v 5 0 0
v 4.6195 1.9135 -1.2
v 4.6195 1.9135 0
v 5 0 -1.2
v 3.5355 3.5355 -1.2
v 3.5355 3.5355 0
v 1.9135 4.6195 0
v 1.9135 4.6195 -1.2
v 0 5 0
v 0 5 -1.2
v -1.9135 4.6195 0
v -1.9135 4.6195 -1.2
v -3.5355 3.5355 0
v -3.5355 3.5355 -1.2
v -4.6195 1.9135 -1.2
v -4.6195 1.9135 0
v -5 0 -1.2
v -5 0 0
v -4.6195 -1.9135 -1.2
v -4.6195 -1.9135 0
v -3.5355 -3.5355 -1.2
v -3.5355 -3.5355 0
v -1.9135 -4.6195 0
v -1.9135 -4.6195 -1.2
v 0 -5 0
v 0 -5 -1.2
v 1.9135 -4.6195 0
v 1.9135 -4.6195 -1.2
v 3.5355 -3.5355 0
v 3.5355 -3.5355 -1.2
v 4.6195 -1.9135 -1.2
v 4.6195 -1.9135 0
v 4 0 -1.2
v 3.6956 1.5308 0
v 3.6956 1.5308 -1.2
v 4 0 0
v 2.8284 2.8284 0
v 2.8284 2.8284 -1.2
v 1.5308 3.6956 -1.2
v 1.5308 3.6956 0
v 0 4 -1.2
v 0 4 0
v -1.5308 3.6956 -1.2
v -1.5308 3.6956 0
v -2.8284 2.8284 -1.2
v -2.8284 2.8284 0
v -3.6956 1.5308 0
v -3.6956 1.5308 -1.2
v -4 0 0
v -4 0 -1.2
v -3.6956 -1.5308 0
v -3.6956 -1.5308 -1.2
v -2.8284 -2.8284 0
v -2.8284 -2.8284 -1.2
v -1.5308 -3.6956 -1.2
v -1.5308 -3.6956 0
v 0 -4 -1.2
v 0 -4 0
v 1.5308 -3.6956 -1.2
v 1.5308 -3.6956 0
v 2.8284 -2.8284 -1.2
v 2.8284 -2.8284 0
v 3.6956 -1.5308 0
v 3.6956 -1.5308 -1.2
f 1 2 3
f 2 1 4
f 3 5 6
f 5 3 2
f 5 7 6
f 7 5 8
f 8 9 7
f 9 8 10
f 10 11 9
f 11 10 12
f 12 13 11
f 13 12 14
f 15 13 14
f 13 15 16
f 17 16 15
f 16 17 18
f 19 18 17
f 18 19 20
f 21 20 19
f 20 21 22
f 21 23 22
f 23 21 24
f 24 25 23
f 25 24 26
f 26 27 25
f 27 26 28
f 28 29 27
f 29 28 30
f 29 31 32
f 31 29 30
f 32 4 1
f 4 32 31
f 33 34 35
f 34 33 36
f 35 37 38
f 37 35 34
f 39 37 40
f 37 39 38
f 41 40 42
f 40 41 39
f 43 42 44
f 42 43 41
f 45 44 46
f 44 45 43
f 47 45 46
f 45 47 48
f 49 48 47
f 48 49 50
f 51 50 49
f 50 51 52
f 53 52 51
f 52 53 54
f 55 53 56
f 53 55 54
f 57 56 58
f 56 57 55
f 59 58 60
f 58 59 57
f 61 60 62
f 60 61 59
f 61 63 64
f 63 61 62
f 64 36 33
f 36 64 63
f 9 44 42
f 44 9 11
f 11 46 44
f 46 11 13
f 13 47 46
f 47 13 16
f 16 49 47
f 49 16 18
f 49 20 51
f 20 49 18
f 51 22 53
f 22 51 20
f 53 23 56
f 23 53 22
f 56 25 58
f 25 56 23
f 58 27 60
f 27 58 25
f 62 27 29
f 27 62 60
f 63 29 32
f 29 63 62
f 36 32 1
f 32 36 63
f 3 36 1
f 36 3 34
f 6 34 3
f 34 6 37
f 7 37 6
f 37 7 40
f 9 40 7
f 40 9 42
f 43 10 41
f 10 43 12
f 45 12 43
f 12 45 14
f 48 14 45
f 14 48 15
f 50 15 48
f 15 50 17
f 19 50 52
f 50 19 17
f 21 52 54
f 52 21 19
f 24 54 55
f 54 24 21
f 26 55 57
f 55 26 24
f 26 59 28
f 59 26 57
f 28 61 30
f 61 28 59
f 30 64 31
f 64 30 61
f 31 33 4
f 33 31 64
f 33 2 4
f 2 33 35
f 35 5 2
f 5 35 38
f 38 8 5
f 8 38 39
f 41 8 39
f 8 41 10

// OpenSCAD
// file: ../p/4-4edge.scad
use <../lib.scad>
function ldraw_lib__4_4edge() = [
// 0 Circle 1.0
// 0 Name: 4-4edge.dat
// 0 Author: James Jessiman
// 0 !LDRAW_ORG Primitive UPDATE 2017-01
// 0 !LICENSE Licensed under CC BY 2.0 and CC BY 4.0 : see CAreadme.txt
// 
// 0 BFC CERTIFY CCW
  [0,"BFC","CERTIFY"],
  [0,"BFC","CCW"],
// 
// 0 !HISTORY 1998-12-15 [PTadmin] Official Update 1998-10
// 0 !HISTORY 2005-12-28 [PTadmin] Official Update 2005-01
// 0 !HISTORY 2007-06-24 [PTadmin] Header formatted for Contributor Agreement
// 0 !HISTORY 2008-07-01 [PTadmin] Official Update 2008-01
// 0 !HISTORY 2017-01-15 [Steffen] BFCed
// 0 !HISTORY 2017-12-30 [PTadmin] Official Update 2017-01
// 
// 
// 2 24 1 0 0 0.9239 0 0.3827
  [2,24,1,0,0,0.9239,0,0.3827],
// 2 24 0.9239 0 0.3827 0.7071 0 0.7071
  [2,24,0.9239,0,0.3827,0.7071,0,0.7071],
// 2 24 0.7071 0 0.7071 0.3827 0 0.9239
  [2,24,0.7071,0,0.7071,0.3827,0,0.9239],
// 2 24 0.3827 0 0.9239 0 0 1
  [2,24,0.3827,0,0.9239,0,0,1],
// 2 24 0 0 1 -0.3827 0 0.9239
  [2,24,0,0,1,-0.3827,0,0.9239],
// 2 24 -0.3827 0 0.9239 -0.7071 0 0.7071
  [2,24,-0.3827,0,0.9239,-0.7071,0,0.7071],
// 2 24 -0.7071 0 0.7071 -0.9239 0 0.3827
  [2,24,-0.7071,0,0.7071,-0.9239,0,0.3827],
// 2 24 -0.9239 0 0.3827 -1 0 -0
  [2,24,-0.9239,0,0.3827,-1,0,-0],
// 2 24 -1 0 -0 -0.9239 0 -0.3827
  [2,24,-1,0,-0,-0.9239,0,-0.3827],
// 2 24 -0.9239 0 -0.3827 -0.7071 0 -0.7071
  [2,24,-0.9239,0,-0.3827,-0.7071,0,-0.7071],
// 2 24 -0.7071 0 -0.7071 -0.3827 0 -0.9239
  [2,24,-0.7071,0,-0.7071,-0.3827,0,-0.9239],
// 2 24 -0.3827 0 -0.9239 0 0 -1
  [2,24,-0.3827,0,-0.9239,0,0,-1],
// 2 24 0 0 -1 0.3827 0 -0.9239
  [2,24,0,0,-1,0.3827,0,-0.9239],
// 2 24 0.3827 0 -0.9239 0.7071 0 -0.7071
  [2,24,0.3827,0,-0.9239,0.7071,0,-0.7071],
// 2 24 0.7071 0 -0.7071 0.9239 0 -0.3827
  [2,24,0.7071,0,-0.7071,0.9239,0,-0.3827],
// 2 24 0.9239 0 -0.3827 1 0 0
  [2,24,0.9239,0,-0.3827,1,0,0],
];
makepoly(ldraw_lib__4_4edge(), line=0.2);
// file: ../p/4-4cyli.scad
use <../lib.scad>
function ldraw_lib__4_4cyli() = [
// 0 Cylinder 1.0
// 0 Name: 4-4cyli.dat
// 0 Author: James Jessiman
// 0 !LDRAW_ORG Primitive UPDATE 2005-01
// 0 !LICENSE Licensed under CC BY 2.0 and CC BY 4.0 : see CAreadme.txt
// 
// 0 BFC CERTIFY CCW
  [0,"BFC","CERTIFY"],
  [0,"BFC","CCW"],
// 
// 0 !HISTORY 1998-12-15 [PTadmin] Official Update 1998-10
// 0 !HISTORY 2002-03-23 [sbliss] Added BFC statement; merged headers from files in distributions LDraw 0.27 and Complete.
// 0 !HISTORY 2002-04-25 [PTadmin] Official Update 2002-02
// 0 !HISTORY 2004-12-14 [guyvivan] BFC CCW
// 0 !HISTORY 2005-12-28 [PTadmin] Official Update 2005-01
// 0 !HISTORY 2007-06-24 [PTadmin] Header formatted for Contributor Agreement
// 0 !HISTORY 2008-07-01 [PTadmin] Official Update 2008-01
// 
// 
// 4 16 1 1 0 0.9239 1 0.3827 0.9239 0 0.3827 1 0 0
  [4,16,1,1,0,0.9239,1,0.3827,0.9239,0,0.3827,1,0,0],
// 5 24 1 0 0 1 1 0 0.9239 0 0.3827 0.9239 0 -0.3827
  [5,24,1,0,0,1,1,0,0.9239,0,0.3827,0.9239,0,-0.3827],
// 4 16 0.9239 1 0.3827 0.7071 1 0.7071 0.7071 0 0.7071 0.9239 0 0.3827
  [4,16,0.9239,1,0.3827,0.7071,1,0.7071,0.7071,0,0.7071,0.9239,0,0.3827],
// 5 24 0.9239 0 0.3827 0.9239 1 0.3827 0.7071 0 0.7071 1 0 0
  [5,24,0.9239,0,0.3827,0.9239,1,0.3827,0.7071,0,0.7071,1,0,0],
// 4 16 0.7071 1 0.7071 0.3827 1 0.9239 0.3827 0 0.9239 0.7071 0 0.7071
  [4,16,0.7071,1,0.7071,0.3827,1,0.9239,0.3827,0,0.9239,0.7071,0,0.7071],
// 5 24 0.7071 0 0.7071 0.7071 1 0.7071 0.3827 0 0.9239 0.9239 0 0.3827
  [5,24,0.7071,0,0.7071,0.7071,1,0.7071,0.3827,0,0.9239,0.9239,0,0.3827],
// 4 16 0.3827 1 0.9239 0 1 1 0 0 1 0.3827 0 0.9239
  [4,16,0.3827,1,0.9239,0,1,1,0,0,1,0.3827,0,0.9239],
// 5 24 0.3827 0 0.9239 0.3827 1 0.9239 0 0 1 0.7071 0 0.7071
  [5,24,0.3827,0,0.9239,0.3827,1,0.9239,0,0,1,0.7071,0,0.7071],
// 4 16 0 1 1 -0.3827 1 0.9239 -0.3827 0 0.9239 0 0 1
  [4,16,0,1,1,-0.3827,1,0.9239,-0.3827,0,0.9239,0,0,1],
// 5 24 0 0 1 0 1 1 -0.3827 0 0.9239 0.3827 0 0.9239
  [5,24,0,0,1,0,1,1,-0.3827,0,0.9239,0.3827,0,0.9239],
// 4 16 -0.3827 1 0.9239 -0.7071 1 0.7071 -0.7071 0 0.7071 -0.3827 0 0.9239
  [4,16,-0.3827,1,0.9239,-0.7071,1,0.7071,-0.7071,0,0.7071,-0.3827,0,0.9239],
// 5 24 -0.3827 0 0.9239 -0.3827 1 0.9239 -0.7071 0 0.7071 0 0 1
  [5,24,-0.3827,0,0.9239,-0.3827,1,0.9239,-0.7071,0,0.7071,0,0,1],
// 4 16 -0.7071 1 0.7071 -0.9239 1 0.3827 -0.9239 0 0.3827 -0.7071 0 0.7071
  [4,16,-0.7071,1,0.7071,-0.9239,1,0.3827,-0.9239,0,0.3827,-0.7071,0,0.7071],
// 5 24 -0.7071 0 0.7071 -0.7071 1 0.7071 -0.9239 0 0.3827 -0.3827 0 0.9239
  [5,24,-0.7071,0,0.7071,-0.7071,1,0.7071,-0.9239,0,0.3827,-0.3827,0,0.9239],
// 4 16 -0.9239 1 0.3827 -1 1 0 -1 0 0 -0.9239 0 0.3827
  [4,16,-0.9239,1,0.3827,-1,1,0,-1,0,0,-0.9239,0,0.3827],
// 5 24 -0.9239 0 0.3827 -0.9239 1 0.3827 -1 0 0 -0.7071 0 0.7071
  [5,24,-0.9239,0,0.3827,-0.9239,1,0.3827,-1,0,0,-0.7071,0,0.7071],
// 4 16 -1 1 0 -0.9239 1 -0.3827 -0.9239 0 -0.3827 -1 0 0
  [4,16,-1,1,0,-0.9239,1,-0.3827,-0.9239,0,-0.3827,-1,0,0],
// 5 24 -1 0 0 -1 1 0 -0.9239 0 -0.3827 -0.9239 0 0.3827
  [5,24,-1,0,0,-1,1,0,-0.9239,0,-0.3827,-0.9239,0,0.3827],
// 4 16 -0.9239 1 -0.3827 -0.7071 1 -0.7071 -0.7071 0 -0.7071 -0.9239 0 -0.3827
  [4,16,-0.9239,1,-0.3827,-0.7071,1,-0.7071,-0.7071,0,-0.7071,-0.9239,0,-0.3827],
// 5 24 -0.9239 0 -0.3827 -0.9239 1 -0.3827 -0.7071 0 -0.7071 -1 0 0
  [5,24,-0.9239,0,-0.3827,-0.9239,1,-0.3827,-0.7071,0,-0.7071,-1,0,0],
// 4 16 -0.7071 1 -0.7071 -0.3827 1 -0.9239 -0.3827 0 -0.9239 -0.7071 0 -0.7071
  [4,16,-0.7071,1,-0.7071,-0.3827,1,-0.9239,-0.3827,0,-0.9239,-0.7071,0,-0.7071],
// 5 24 -0.7071 0 -0.7071 -0.7071 1 -0.7071 -0.3827 0 -0.9239 -0.9239 0 -0.3827
  [5,24,-0.7071,0,-0.7071,-0.7071,1,-0.7071,-0.3827,0,-0.9239,-0.9239,0,-0.3827],
// 4 16 -0.3827 1 -0.9239 0 1 -1 0 0 -1 -0.3827 0 -0.9239
  [4,16,-0.3827,1,-0.9239,0,1,-1,0,0,-1,-0.3827,0,-0.9239],
// 5 24 -0.3827 0 -0.9239 -0.3827 1 -0.9239 0 0 -1 -0.7071 0 -0.7071
  [5,24,-0.3827,0,-0.9239,-0.3827,1,-0.9239,0,0,-1,-0.7071,0,-0.7071],
// 4 16 0 1 -1 0.3827 1 -0.9239 0.3827 0 -0.9239 0 0 -1
  [4,16,0,1,-1,0.3827,1,-0.9239,0.3827,0,-0.9239,0,0,-1],
// 5 24 0 0 -1 0 1 -1 0.3827 0 -0.9239 -0.3827 0 -0.9239
  [5,24,0,0,-1,0,1,-1,0.3827,0,-0.9239,-0.3827,0,-0.9239],
// 4 16 0.3827 1 -0.9239 0.7071 1 -0.7071 0.7071 0 -0.7071 0.3827 0 -0.9239
  [4,16,0.3827,1,-0.9239,0.7071,1,-0.7071,0.7071,0,-0.7071,0.3827,0,-0.9239],
// 5 24 0.3827 0 -0.9239 0.3827 1 -0.9239 0.7071 0 -0.7071 0 0 -1
  [5,24,0.3827,0,-0.9239,0.3827,1,-0.9239,0.7071,0,-0.7071,0,0,-1],
// 4 16 0.7071 1 -0.7071 0.9239 1 -0.3827 0.9239 0 -0.3827 0.7071 0 -0.7071
  [4,16,0.7071,1,-0.7071,0.9239,1,-0.3827,0.9239,0,-0.3827,0.7071,0,-0.7071],
// 5 24 0.7071 0 -0.7071 0.7071 1 -0.7071 0.9239 0 -0.3827 0.3827 0 -0.9239
  [5,24,0.7071,0,-0.7071,0.7071,1,-0.7071,0.9239,0,-0.3827,0.3827,0,-0.9239],
// 4 16 0.9239 1 -0.3827 1 1 0 1 0 0 0.9239 0 -0.3827
  [4,16,0.9239,1,-0.3827,1,1,0,1,0,0,0.9239,0,-0.3827],
// 5 24 0.9239 0 -0.3827 0.9239 1 -0.3827 1 0 0 0.7071 0 -0.7071
  [5,24,0.9239,0,-0.3827,0.9239,1,-0.3827,1,0,0,0.7071,0,-0.7071],
// 0
];
makepoly(ldraw_lib__4_4cyli(), line=0.2);
// file: ../p/4-4ring4.scad
use <../lib.scad>
function ldraw_lib__4_4ring4() = [
// 0 Ring  4 x 1.0
// 0 Name: 4-4ring4.dat
// 0 Author: James Jessiman
// 0 !LDRAW_ORG Primitive UPDATE 2009-01
// 0 !LICENSE Licensed under CC BY 2.0 and CC BY 4.0 : see CAreadme.txt
// 
// 0 BFC CERTIFY CCW
  [0,"BFC","CERTIFY"],
  [0,"BFC","CCW"],
// 
// 0 !HISTORY 1998-12-15 [PTadmin] Official Update 1998-10
// 0 !HISTORY 2002-04-08 [BrickCaster] Modified for BFC compliance
// 0 !HISTORY 2002-04-25 [PTadmin] Official Update 2002-02
// 0 !HISTORY 2007-06-24 [PTadmin] Header formatted for Contributor Agreement
// 0 !HISTORY 2008-07-01 [PTadmin] Official Update 2008-01
// 0 !HISTORY 2008-08-26 [cwdee] Switch polygon winding and rename
// 0 !HISTORY 2009-05-02 [PTadmin] Official Update 2009-01
// 
// 
// 4 16 -1.9135 0 4.6195 -1.5308 0 3.6956 0 0 4 0 0 5
  [4,16,-1.9135,0,4.6195,-1.5308,0,3.6956,0,0,4,0,0,5],
// 4 16 -3.5355 0 3.5355 -2.8284 0 2.8284 -1.5308 0 3.6956 -1.9135 0 4.6195
  [4,16,-3.5355,0,3.5355,-2.8284,0,2.8284,-1.5308,0,3.6956,-1.9135,0,4.6195],
// 4 16 -4.6195 0 1.9135 -3.6956 0 1.5308 -2.8284 0 2.8284 -3.5355 0 3.5355
  [4,16,-4.6195,0,1.9135,-3.6956,0,1.5308,-2.8284,0,2.8284,-3.5355,0,3.5355],
// 4 16 -5 0 0 -4 0 0 -3.6956 0 1.5308 -4.6195 0 1.9135
  [4,16,-5,0,0,-4,0,0,-3.6956,0,1.5308,-4.6195,0,1.9135],
// 4 16 -4.6195 0 -1.9135 -3.6956 0 -1.5308 -4 0 0 -5 0 0
  [4,16,-4.6195,0,-1.9135,-3.6956,0,-1.5308,-4,0,0,-5,0,0],
// 4 16 -3.5355 0 -3.5355 -2.8284 0 -2.8284 -3.6956 0 -1.5308 -4.6195 0 -1.9135
  [4,16,-3.5355,0,-3.5355,-2.8284,0,-2.8284,-3.6956,0,-1.5308,-4.6195,0,-1.9135],
// 4 16 -1.9135 0 -4.6195 -1.5308 0 -3.6956 -2.8284 0 -2.8284 -3.5355 0 -3.5355
  [4,16,-1.9135,0,-4.6195,-1.5308,0,-3.6956,-2.8284,0,-2.8284,-3.5355,0,-3.5355],
// 4 16 0 0 -5 0 0 -4 -1.5308 0 -3.6956 -1.9135 0 -4.6195
  [4,16,0,0,-5,0,0,-4,-1.5308,0,-3.6956,-1.9135,0,-4.6195],
// 4 16 1.9135 0 -4.6195 1.5308 0 -3.6956 0 0 -4 0 0 -5
  [4,16,1.9135,0,-4.6195,1.5308,0,-3.6956,0,0,-4,0,0,-5],
// 4 16 3.5355 0 -3.5355 2.8284 0 -2.8284 1.5308 0 -3.6956 1.9135 0 -4.6195
  [4,16,3.5355,0,-3.5355,2.8284,0,-2.8284,1.5308,0,-3.6956,1.9135,0,-4.6195],
// 4 16 4.6195 0 -1.9135 3.6956 0 -1.5308 2.8284 0 -2.8284 3.5355 0 -3.5355
  [4,16,4.6195,0,-1.9135,3.6956,0,-1.5308,2.8284,0,-2.8284,3.5355,0,-3.5355],
// 4 16 5 0 0 4 0 0 3.6956 0 -1.5308 4.6195 0 -1.9135
  [4,16,5,0,0,4,0,0,3.6956,0,-1.5308,4.6195,0,-1.9135],
// 4 16 4.6195 0 1.9135 3.6956 0 1.5308 4 0 0 5 0 0
  [4,16,4.6195,0,1.9135,3.6956,0,1.5308,4,0,0,5,0,0],
// 4 16 3.5355 0 3.5355 2.8284 0 2.8284 3.6956 0 1.5308 4.6195 0 1.9135
  [4,16,3.5355,0,3.5355,2.8284,0,2.8284,3.6956,0,1.5308,4.6195,0,1.9135],
// 4 16 1.9135 0 4.6195 1.5308 0 3.6956 2.8284 0 2.8284 3.5355 0 3.5355
  [4,16,1.9135,0,4.6195,1.5308,0,3.6956,2.8284,0,2.8284,3.5355,0,3.5355],
// 4 16 0 0 5 0 0 4 1.5308 0 3.6956 1.9135 0 4.6195
  [4,16,0,0,5,0,0,4,1.5308,0,3.6956,1.9135,0,4.6195],
// 0
];
makepoly(ldraw_lib__4_4ring4(), line=0.2);
// file: ../p/4-4cylo.scad
use <../lib.scad>
use <4-4cyli.scad>
use <4-4edge.scad>
function ldraw_lib__4_4cylo() = [
// 0 Cylinder Open 1.0
// 0 Name: 4-4cylo.dat
// 0 Author: Mark Kennedy [mkennedy]
// 0 !LDRAW_ORG Primitive UPDATE 2010-01
// 0 !LICENSE Licensed under CC BY 2.0 and CC BY 4.0 : see CAreadme.txt
// 
// 0 BFC CERTIFY CCW
  [0,"BFC","CERTIFY"],
  [0,"BFC","CCW"],
// 
// 0 !HISTORY 2010-04-05 [PTadmin] Official Update 2010-01
// 
// 
// 1 16 0 0 0 1 0 0 0 1 0 0 0 1 4-4edge.dat
  [1,16,0,0,0,1,0,0,0,1,0,0,0,1, ldraw_lib__4_4edge()],
// 1 16 0 1 0 1 0 0 0 1 0 0 0 1 4-4edge.dat
  [1,16,0,1,0,1,0,0,0,1,0,0,0,1, ldraw_lib__4_4edge()],
// 1 16 0 0 0 1 0 0 0 1 0 0 0 1 4-4cyli.dat
  [1,16,0,0,0,1,0,0,0,1,0,0,0,1, ldraw_lib__4_4cyli()],
// 0
];
makepoly(ldraw_lib__4_4cylo(), line=0.2);
// main file
use <../lib.scad>
use <../p/4-4cylo.scad>
use <../p/4-4ring4.scad>
function ldraw_lib__u9394() = [
// 0 ~Electric Powered Up 6 Port Hub Bluetooth Button Lighting Ring
// 0 Name: u9394.dat
// 0 Author: Philippe Hurbain [Philo]
// 0 !LDRAW_ORG Part UPDATE 2020-03
// 0 !LICENSE Licensed under CC BY 2.0 and CC BY 4.0 : see CAreadme.txt
// 
// 0 BFC CERTIFY CCW
  [0,"BFC","CERTIFY"],
  [0,"BFC","CCW"],
// 
// 0 !KEYWORDS Mindstorms, Robot Inventor, Spike Prime
// 
// 0 !HISTORY 2019-12-27 [PTadmin] Official Update 2019-03
// 0 !HISTORY 2020-12-27 [PTadmin] Update description
// 0 !HISTORY 2020-12-29 [PTadmin] Official Update 2020-03
// 
// 
// 1 16 0 0 0 12.5 0 0 0 3 0 0 0 12.5 4-4cylo.dat
  [1,16,0,0,0,12.5,0,0,0,3,0,0,0,12.5, ldraw_lib__4_4cylo()],
// 0 BFC INVERTNEXT
  [0,"BFC","INVERTNEXT"],
// 1 16 0 0 0 10 0 0 0 3 0 0 0 10 4-4cylo.dat
  [1,16,0,0,0,10,0,0,0,3,0,0,0,10, ldraw_lib__4_4cylo()],
// 1 16 0 0 0 2.5 0 0 0 1 0 0 0 2.5 4-4ring4.dat
  [1,16,0,0,0,2.5,0,0,0,1,0,0,0,2.5, ldraw_lib__4_4ring4()],
// 1 16 0 3 0 2.5 0 0 0 -1 0 0 0 2.5 4-4ring4.dat
  [1,16,0,3,0,2.5,0,0,0,-1,0,0,0,2.5, ldraw_lib__4_4ring4()],
];
makepoly(ldraw_lib__u9394(), line=0.2);
